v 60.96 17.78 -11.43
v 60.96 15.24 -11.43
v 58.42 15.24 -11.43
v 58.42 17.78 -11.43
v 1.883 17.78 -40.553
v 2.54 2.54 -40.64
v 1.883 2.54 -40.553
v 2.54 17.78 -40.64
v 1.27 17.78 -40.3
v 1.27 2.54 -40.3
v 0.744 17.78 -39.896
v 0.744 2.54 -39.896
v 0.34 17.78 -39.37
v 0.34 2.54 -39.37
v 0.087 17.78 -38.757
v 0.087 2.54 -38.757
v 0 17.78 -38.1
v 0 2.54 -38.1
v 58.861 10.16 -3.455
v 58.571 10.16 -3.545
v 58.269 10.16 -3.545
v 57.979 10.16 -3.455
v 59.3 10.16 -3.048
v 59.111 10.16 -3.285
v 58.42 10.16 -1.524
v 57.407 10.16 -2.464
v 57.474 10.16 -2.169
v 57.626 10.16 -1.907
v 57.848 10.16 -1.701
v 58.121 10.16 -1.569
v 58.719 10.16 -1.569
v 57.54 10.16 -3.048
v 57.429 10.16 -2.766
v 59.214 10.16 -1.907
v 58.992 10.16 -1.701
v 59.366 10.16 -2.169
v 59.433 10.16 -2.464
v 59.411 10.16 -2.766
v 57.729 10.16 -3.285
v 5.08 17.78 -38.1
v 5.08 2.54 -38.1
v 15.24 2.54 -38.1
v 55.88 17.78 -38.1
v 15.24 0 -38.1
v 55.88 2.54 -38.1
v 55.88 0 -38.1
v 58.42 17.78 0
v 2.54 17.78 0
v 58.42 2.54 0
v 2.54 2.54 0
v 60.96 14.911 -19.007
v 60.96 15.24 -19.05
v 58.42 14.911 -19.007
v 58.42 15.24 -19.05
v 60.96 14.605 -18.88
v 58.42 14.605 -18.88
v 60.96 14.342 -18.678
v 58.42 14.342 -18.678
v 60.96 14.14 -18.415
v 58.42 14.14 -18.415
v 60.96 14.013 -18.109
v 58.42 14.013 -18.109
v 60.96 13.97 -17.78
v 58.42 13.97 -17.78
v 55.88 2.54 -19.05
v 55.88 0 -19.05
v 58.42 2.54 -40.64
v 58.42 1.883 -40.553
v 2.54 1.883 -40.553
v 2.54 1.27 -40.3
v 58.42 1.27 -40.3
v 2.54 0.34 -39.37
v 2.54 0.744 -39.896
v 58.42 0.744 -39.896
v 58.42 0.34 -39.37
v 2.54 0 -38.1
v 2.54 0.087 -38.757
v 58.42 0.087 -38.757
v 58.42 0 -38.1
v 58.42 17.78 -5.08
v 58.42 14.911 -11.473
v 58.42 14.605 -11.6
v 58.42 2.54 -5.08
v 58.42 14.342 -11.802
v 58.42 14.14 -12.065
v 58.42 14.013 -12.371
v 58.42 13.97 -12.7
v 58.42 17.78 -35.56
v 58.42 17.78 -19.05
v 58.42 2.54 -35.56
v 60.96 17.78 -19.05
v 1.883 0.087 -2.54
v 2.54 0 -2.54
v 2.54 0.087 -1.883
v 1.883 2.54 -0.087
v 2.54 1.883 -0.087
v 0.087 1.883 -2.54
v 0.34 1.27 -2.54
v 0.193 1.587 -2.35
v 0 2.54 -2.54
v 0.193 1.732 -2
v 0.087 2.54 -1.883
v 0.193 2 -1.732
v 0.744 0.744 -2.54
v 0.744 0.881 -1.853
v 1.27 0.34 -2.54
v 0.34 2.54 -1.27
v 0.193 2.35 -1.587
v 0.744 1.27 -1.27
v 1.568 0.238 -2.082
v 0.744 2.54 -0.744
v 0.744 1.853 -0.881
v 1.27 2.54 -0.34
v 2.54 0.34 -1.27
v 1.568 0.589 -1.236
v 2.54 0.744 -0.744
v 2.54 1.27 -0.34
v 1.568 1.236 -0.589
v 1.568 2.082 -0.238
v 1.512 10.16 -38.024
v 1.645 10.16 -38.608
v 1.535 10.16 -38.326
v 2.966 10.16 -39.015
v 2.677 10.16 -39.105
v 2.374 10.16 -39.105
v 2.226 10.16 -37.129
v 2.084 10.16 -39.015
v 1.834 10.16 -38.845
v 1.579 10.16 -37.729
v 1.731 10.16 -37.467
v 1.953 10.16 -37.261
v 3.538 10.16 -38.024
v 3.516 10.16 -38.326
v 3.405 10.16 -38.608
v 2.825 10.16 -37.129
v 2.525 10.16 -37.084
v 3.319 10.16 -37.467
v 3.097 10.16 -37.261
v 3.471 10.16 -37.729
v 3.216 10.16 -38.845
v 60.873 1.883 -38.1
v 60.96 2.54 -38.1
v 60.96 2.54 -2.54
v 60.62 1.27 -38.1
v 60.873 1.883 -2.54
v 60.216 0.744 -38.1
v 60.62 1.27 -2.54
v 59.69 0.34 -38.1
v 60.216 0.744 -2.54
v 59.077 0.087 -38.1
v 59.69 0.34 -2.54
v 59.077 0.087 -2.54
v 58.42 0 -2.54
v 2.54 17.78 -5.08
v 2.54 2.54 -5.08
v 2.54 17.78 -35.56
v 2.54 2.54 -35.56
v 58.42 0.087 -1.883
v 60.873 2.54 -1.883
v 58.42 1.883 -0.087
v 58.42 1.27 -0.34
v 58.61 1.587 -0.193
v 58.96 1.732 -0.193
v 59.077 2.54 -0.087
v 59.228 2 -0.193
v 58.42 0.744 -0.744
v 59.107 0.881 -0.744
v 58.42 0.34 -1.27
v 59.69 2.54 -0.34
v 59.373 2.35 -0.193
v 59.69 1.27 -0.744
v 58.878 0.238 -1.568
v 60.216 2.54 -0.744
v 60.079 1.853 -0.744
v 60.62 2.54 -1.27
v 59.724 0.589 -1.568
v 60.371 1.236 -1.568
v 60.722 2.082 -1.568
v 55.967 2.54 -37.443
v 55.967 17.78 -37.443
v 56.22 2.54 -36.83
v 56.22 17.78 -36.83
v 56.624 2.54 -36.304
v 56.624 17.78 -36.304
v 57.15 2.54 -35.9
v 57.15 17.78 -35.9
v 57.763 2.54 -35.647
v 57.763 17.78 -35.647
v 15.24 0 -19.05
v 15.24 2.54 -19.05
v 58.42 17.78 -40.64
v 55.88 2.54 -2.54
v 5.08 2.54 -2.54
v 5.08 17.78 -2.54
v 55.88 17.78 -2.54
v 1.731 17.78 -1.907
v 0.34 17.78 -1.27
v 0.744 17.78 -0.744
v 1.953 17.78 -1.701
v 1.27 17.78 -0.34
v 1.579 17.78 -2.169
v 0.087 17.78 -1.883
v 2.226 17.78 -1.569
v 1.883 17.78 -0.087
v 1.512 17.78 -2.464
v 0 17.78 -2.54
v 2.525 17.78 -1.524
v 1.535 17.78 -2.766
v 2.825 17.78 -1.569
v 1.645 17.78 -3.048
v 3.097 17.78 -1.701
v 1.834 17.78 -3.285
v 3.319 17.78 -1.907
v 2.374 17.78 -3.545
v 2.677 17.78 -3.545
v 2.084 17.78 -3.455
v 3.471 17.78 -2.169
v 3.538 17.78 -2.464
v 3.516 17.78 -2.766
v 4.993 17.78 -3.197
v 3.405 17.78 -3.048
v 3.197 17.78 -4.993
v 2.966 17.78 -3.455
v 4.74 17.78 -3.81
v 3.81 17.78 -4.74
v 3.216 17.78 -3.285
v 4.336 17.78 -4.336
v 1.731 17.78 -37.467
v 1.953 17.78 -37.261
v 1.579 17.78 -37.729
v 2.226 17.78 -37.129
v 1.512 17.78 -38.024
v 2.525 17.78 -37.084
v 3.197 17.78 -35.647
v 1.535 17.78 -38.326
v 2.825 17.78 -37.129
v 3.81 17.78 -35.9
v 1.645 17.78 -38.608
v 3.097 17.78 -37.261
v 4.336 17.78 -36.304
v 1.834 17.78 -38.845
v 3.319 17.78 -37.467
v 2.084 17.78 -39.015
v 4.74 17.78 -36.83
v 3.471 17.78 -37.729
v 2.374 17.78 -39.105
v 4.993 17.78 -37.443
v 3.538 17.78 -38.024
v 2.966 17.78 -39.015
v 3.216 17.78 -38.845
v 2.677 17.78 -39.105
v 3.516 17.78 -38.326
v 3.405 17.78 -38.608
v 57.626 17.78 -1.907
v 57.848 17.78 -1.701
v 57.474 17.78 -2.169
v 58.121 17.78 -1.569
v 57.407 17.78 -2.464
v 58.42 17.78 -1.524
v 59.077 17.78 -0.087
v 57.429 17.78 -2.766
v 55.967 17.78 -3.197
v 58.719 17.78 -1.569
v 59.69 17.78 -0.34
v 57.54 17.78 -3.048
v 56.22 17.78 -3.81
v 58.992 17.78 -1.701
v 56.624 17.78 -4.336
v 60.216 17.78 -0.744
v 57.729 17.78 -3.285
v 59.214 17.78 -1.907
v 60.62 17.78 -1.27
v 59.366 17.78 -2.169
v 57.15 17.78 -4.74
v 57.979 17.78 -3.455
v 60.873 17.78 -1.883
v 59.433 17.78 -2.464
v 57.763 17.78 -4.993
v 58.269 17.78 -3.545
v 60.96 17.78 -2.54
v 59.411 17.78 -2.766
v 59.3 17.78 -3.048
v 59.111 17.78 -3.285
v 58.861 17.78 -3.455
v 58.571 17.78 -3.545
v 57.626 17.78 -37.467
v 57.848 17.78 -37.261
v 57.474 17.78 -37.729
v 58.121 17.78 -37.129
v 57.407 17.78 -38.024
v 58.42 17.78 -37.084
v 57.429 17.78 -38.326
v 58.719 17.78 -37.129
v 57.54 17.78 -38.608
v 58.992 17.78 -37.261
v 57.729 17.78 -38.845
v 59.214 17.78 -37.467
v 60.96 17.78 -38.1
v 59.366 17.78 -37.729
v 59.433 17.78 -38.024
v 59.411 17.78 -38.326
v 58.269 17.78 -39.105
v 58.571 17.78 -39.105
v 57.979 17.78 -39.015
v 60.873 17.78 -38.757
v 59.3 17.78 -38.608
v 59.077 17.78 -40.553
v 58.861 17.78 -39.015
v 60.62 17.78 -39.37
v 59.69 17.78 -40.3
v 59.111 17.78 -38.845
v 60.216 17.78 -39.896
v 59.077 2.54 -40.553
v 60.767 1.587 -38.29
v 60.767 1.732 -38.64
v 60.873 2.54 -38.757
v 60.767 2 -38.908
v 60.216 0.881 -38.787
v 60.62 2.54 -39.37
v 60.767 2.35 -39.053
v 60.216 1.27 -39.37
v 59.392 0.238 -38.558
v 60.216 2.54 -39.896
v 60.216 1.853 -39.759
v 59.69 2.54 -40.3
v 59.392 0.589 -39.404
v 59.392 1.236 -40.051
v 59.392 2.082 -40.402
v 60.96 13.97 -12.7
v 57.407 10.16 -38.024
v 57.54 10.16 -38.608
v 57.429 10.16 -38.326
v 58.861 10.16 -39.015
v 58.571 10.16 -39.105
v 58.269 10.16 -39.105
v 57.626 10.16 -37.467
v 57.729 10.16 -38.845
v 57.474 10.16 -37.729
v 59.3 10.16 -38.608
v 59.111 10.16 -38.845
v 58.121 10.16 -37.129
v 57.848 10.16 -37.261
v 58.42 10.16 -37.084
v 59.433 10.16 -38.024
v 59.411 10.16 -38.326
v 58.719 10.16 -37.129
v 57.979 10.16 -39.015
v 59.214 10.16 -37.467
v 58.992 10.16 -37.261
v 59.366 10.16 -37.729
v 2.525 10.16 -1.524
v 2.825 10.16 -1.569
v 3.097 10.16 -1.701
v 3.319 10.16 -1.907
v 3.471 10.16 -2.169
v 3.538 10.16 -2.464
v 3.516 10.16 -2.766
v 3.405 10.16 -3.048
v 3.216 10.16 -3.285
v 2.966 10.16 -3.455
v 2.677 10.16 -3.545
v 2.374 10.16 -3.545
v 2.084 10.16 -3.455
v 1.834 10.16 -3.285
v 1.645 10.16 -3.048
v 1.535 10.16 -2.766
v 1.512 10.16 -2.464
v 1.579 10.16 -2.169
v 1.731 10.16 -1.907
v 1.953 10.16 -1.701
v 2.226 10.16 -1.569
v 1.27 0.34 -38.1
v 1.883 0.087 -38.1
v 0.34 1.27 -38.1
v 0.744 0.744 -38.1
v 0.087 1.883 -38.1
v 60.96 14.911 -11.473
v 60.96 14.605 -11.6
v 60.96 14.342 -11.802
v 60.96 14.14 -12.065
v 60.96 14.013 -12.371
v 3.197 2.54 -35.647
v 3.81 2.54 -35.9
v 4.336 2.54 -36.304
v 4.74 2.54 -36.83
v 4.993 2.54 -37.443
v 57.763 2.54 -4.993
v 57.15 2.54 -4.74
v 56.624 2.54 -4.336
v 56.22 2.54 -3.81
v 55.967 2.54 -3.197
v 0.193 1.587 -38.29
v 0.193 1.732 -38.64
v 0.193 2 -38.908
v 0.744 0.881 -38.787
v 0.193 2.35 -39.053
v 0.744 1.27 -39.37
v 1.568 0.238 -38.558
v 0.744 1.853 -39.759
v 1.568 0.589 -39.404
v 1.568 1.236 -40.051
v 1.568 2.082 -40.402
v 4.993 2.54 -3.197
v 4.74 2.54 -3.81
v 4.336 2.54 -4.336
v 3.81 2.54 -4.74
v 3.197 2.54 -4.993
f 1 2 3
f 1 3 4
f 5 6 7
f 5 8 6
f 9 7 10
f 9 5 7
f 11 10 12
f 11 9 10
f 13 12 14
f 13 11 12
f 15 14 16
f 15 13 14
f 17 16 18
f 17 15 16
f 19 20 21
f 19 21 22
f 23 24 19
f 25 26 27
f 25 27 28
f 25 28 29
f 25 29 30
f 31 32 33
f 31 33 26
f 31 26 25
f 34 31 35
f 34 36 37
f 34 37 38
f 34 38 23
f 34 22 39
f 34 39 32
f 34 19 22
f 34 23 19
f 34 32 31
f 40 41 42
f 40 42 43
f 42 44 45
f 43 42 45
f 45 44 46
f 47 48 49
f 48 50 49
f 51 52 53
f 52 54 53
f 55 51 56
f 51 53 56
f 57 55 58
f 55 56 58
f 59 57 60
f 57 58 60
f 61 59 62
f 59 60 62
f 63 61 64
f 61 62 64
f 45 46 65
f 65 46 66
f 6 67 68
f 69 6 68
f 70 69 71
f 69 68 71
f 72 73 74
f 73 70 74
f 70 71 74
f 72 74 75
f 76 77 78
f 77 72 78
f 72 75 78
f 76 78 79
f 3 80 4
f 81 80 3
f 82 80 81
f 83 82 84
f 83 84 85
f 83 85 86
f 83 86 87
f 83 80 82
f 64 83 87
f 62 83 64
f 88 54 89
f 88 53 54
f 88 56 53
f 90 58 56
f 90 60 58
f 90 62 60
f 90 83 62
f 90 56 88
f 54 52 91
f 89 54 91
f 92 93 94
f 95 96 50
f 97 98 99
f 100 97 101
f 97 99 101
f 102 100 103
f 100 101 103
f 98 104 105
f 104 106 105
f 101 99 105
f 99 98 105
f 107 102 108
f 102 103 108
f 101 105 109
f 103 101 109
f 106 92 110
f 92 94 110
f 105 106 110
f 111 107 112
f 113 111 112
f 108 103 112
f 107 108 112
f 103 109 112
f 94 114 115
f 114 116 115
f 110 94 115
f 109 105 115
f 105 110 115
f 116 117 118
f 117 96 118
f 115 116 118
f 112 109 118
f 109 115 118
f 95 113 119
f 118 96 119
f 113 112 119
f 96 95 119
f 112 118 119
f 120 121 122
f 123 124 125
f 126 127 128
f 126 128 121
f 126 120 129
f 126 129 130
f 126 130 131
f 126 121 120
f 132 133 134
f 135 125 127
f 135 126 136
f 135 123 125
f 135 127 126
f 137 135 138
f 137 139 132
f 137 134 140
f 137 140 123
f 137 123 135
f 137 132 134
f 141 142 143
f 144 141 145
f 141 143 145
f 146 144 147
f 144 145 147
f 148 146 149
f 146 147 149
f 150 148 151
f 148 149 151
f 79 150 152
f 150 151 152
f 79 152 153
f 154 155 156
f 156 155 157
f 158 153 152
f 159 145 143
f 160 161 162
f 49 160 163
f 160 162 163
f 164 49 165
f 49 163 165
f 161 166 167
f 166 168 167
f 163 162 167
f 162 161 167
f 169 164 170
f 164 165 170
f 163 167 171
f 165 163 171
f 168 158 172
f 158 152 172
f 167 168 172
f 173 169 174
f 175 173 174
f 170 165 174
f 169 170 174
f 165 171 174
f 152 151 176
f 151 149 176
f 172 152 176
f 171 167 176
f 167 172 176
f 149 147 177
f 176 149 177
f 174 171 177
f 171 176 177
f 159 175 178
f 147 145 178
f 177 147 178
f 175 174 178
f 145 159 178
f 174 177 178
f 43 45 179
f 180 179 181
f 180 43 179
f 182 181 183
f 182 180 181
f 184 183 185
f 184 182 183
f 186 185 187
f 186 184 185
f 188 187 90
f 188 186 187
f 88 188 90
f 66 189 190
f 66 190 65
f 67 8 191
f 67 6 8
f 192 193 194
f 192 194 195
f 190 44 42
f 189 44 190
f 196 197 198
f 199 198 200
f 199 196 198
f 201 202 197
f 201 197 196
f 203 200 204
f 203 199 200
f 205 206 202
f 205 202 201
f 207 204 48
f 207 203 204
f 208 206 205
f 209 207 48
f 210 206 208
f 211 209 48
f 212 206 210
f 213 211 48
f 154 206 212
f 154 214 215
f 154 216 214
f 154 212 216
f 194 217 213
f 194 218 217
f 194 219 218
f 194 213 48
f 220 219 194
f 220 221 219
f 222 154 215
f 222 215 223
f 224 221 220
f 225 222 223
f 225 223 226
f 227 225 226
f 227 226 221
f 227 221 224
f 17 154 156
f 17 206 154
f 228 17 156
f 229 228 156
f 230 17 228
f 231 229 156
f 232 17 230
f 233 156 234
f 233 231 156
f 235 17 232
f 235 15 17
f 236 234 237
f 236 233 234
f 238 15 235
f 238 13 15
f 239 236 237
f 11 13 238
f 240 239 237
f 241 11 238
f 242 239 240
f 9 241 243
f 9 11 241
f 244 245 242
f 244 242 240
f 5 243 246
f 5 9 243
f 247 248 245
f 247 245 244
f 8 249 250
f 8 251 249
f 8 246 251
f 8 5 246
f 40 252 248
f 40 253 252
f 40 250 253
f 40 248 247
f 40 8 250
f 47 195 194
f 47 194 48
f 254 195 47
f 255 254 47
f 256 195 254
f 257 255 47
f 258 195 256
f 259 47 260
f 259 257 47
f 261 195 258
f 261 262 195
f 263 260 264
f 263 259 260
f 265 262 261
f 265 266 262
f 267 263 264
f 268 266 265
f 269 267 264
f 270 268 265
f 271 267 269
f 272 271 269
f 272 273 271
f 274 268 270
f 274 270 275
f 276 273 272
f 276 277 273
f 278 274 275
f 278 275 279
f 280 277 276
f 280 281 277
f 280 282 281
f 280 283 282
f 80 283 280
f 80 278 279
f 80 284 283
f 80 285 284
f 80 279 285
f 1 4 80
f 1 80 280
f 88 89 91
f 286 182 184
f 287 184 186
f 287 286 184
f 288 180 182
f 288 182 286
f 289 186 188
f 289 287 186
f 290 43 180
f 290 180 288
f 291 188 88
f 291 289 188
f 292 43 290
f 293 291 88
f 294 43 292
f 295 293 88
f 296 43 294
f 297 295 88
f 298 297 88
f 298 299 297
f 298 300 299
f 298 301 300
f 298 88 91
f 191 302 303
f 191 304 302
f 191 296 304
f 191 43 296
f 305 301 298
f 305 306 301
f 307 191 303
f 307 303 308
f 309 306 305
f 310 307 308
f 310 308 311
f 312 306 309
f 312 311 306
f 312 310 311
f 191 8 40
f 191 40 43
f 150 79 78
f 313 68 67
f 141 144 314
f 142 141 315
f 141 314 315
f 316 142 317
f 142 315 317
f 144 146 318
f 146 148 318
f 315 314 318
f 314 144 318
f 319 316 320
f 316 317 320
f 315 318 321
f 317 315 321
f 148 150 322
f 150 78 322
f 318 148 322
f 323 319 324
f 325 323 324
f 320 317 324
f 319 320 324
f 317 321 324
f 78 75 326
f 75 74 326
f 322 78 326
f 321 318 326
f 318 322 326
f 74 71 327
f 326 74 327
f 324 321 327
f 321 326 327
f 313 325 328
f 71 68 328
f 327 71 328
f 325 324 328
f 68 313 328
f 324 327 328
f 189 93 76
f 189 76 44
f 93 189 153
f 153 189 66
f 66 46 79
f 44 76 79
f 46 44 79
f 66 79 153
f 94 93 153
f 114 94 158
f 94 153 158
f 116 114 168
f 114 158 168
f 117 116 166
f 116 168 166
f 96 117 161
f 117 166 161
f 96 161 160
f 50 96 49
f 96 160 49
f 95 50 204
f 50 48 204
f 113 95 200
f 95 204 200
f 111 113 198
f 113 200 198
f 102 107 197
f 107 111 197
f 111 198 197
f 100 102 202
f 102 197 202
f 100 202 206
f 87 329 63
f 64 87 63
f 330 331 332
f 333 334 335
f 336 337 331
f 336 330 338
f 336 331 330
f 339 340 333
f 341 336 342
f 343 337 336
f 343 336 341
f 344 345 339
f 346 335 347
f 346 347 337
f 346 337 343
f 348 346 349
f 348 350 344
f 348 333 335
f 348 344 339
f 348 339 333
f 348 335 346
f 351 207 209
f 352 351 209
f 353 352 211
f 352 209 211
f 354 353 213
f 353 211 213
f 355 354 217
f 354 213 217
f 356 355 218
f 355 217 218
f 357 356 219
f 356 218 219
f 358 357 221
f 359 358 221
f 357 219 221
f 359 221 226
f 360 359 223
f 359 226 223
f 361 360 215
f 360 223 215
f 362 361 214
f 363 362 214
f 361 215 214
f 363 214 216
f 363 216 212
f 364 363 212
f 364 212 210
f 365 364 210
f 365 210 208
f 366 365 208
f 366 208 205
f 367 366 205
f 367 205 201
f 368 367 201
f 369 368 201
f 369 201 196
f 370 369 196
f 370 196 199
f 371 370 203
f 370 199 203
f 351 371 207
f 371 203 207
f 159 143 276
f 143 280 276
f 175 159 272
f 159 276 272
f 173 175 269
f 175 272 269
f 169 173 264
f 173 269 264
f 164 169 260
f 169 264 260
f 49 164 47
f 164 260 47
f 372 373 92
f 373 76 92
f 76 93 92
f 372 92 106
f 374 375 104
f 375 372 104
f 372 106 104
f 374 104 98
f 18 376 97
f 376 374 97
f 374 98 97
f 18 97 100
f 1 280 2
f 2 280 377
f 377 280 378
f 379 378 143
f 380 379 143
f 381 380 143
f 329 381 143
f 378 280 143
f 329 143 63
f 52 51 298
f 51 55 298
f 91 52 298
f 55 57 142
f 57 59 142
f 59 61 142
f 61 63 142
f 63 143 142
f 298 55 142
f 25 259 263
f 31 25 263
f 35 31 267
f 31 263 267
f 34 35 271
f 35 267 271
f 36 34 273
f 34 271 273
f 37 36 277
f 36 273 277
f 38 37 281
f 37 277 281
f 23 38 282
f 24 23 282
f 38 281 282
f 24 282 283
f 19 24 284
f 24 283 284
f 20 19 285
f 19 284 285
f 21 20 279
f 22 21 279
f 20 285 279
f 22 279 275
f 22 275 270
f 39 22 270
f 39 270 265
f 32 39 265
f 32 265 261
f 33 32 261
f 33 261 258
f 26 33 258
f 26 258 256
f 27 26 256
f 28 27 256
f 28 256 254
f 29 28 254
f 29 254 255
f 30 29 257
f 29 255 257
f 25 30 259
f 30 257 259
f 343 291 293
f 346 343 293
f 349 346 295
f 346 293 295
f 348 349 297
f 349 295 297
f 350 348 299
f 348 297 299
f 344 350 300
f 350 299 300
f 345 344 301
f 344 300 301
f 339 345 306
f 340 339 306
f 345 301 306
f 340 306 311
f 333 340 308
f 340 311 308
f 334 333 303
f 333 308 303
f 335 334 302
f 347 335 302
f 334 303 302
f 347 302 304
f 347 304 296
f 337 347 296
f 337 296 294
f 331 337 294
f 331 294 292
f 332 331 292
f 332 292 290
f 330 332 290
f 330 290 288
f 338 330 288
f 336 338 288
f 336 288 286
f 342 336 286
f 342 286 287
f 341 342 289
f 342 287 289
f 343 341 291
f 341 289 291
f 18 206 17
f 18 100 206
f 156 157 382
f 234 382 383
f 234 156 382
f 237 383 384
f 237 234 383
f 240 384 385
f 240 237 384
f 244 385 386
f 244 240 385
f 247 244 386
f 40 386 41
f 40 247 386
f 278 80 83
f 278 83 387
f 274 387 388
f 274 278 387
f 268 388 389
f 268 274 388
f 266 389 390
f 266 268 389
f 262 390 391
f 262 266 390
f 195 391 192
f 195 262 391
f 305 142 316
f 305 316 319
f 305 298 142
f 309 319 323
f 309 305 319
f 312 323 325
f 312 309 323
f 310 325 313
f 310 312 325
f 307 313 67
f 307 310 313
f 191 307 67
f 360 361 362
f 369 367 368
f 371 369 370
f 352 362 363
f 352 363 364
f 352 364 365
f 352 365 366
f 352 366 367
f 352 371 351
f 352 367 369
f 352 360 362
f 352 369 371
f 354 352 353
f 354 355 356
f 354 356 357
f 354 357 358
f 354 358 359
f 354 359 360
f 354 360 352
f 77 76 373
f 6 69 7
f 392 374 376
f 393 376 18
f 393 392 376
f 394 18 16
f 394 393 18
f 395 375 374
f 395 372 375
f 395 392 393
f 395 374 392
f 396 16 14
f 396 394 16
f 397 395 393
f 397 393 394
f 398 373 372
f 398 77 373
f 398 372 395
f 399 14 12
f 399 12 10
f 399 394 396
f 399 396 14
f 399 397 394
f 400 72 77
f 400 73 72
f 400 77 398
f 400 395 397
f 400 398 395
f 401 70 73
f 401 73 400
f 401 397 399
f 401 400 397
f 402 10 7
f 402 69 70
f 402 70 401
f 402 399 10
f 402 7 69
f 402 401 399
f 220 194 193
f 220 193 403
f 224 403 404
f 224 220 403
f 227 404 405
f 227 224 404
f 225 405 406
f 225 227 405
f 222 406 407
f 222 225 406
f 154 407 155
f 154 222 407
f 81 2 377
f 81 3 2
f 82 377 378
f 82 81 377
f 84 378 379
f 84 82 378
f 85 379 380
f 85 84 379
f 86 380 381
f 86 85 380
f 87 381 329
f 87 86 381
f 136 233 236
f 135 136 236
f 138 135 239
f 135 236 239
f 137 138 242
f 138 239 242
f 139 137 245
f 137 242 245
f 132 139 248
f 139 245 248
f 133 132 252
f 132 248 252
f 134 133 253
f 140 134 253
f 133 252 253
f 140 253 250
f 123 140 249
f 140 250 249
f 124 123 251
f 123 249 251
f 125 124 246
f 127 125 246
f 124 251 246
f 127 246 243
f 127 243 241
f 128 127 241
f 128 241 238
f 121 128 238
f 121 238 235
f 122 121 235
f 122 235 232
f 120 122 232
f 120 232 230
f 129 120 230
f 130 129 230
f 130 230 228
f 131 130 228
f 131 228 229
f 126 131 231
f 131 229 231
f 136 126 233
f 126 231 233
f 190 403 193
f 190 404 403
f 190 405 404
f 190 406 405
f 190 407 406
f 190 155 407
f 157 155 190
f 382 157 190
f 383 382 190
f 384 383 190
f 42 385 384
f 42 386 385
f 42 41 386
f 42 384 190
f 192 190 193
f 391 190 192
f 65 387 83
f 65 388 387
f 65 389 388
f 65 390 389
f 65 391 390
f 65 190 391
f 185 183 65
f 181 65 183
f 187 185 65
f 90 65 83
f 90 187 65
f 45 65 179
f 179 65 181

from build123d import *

# Parameters (mm, degrees)
SKETCH1_W           = 60.96
SKETCH1_H           = 40.64
BOSS_EXTRUDE1_DEPTH = 17.78
SHELL1_T            = -2.54
SKETCH2_R           = 2.54
BOSS_EXTRUDE2_DEPTH = 17.78
SKETCH3_R           = 1.016
CUT_EXTRUDE2_DEPTH  = 7.62
SKETCH5_W           = 7.62
SKETCH5_H           = 3.81
CUT_EXTRUDE3_DEPTH  = 2.54
FILLET1_R           = 1.27
SKETCH6_W           = 40.64
SKETCH6_H           = 19.05
CUT_EXTRUDE4_DEPTH  = 2.54
FILLET3_R           = 2.54


with BuildPart() as part:
    # Sketch1 → Boss-Extrude1 (new body)
    with BuildSketch(Plane(origin=(0, 0, 0), x_dir=(1, 0, 0), z_dir=(0, 1, 0))):
        with Locations((30.48, 20.32)):
            Rectangle(SKETCH1_W, SKETCH1_H)
    extrude(amount=BOSS_EXTRUDE1_DEPTH)

    # Shell1
    shell1_openings = [part.faces().sort_by_distance(p)[0] for p in [
        (30.48, 17.78, -20.32),
    ]]
    offset(amount=SHELL1_T, openings=shell1_openings, kind=Kind.INTERSECTION)

    # Sketch2 → Boss-Extrude2 (add)
    with BuildSketch(Plane(origin=(0, 17.78, 0), x_dir=(1, 0, 0), z_dir=(0, 1, 0))):
        with Locations((2.54, 2.54)):
            Circle(SKETCH2_R)
        with Locations((58.42, 2.54)):
            Circle(SKETCH2_R)
        with Locations((58.42, 38.1)):
            Circle(SKETCH2_R)
        with Locations((2.54, 38.1)):
            Circle(SKETCH2_R)
    extrude(amount=-BOSS_EXTRUDE2_DEPTH)

    # Sketch3 → Cut-Extrude2 (cut)
    with BuildSketch(Plane(origin=(0, 17.78, 0), x_dir=(1, 0, 0), z_dir=(0, 1, 0))):
        with Locations(Location((2.525101816, 38.1, 0), (0, 0, 270))):
            Circle(SKETCH3_R)
        with Locations(Location((2.525101816, 2.54, 0), (0, 0, 270))):
            Circle(SKETCH3_R)
        with Locations(Location((58.42, 2.54, 0), (0, 0, 270))):
            Circle(SKETCH3_R)
        with Locations(Location((58.42, 38.1, 0), (0, 0, 270))):
            Circle(SKETCH3_R)
    extrude(amount=-CUT_EXTRUDE2_DEPTH, mode=Mode.SUBTRACT)

    # Sketch5 → Cut-Extrude3 (cut)
    with BuildSketch(Plane(origin=(60.96, 0, 0), x_dir=(0, 0, -1), z_dir=(1, 0, 0))):
        with Locations((15.24, 15.875)):
            Rectangle(SKETCH5_W, SKETCH5_H)
    extrude(amount=-CUT_EXTRUDE3_DEPTH, mode=Mode.SUBTRACT)

    # Fillet1
    fillet1_edges = [part.edges().sort_by_distance(p)[0] for p in [
        (59.69, 13.97, -19.05),
        (59.69, 13.97, -11.43),
    ]]
    fillet(fillet1_edges, radius=FILLET1_R)

    # Sketch6 → Cut-Extrude4 (cut)
    with BuildSketch(Plane.XZ):
        with Locations((35.56, -28.575)):
            Rectangle(SKETCH6_W, SKETCH6_H)
    extrude(amount=-CUT_EXTRUDE4_DEPTH, mode=Mode.SUBTRACT)

    # Fillet3
    fillet3_edges = [part.edges().sort_by_distance(p)[0] for p in [
        (30.48, 0, -40.64),
        (60.96, 0, -20.32),
        (30.48, 0, 0),
        (0, 0, -20.32),
        (0, 8.89, -40.64),
        (60.96, 8.89, -40.64),
        (60.96, 8.89, 0),
        (0, 8.89, 0),
    ]]
    fillet(fillet3_edges, radius=FILLET3_R - 0.0001)  # a hair under: the kernel refuses the full size


solid = part.part
